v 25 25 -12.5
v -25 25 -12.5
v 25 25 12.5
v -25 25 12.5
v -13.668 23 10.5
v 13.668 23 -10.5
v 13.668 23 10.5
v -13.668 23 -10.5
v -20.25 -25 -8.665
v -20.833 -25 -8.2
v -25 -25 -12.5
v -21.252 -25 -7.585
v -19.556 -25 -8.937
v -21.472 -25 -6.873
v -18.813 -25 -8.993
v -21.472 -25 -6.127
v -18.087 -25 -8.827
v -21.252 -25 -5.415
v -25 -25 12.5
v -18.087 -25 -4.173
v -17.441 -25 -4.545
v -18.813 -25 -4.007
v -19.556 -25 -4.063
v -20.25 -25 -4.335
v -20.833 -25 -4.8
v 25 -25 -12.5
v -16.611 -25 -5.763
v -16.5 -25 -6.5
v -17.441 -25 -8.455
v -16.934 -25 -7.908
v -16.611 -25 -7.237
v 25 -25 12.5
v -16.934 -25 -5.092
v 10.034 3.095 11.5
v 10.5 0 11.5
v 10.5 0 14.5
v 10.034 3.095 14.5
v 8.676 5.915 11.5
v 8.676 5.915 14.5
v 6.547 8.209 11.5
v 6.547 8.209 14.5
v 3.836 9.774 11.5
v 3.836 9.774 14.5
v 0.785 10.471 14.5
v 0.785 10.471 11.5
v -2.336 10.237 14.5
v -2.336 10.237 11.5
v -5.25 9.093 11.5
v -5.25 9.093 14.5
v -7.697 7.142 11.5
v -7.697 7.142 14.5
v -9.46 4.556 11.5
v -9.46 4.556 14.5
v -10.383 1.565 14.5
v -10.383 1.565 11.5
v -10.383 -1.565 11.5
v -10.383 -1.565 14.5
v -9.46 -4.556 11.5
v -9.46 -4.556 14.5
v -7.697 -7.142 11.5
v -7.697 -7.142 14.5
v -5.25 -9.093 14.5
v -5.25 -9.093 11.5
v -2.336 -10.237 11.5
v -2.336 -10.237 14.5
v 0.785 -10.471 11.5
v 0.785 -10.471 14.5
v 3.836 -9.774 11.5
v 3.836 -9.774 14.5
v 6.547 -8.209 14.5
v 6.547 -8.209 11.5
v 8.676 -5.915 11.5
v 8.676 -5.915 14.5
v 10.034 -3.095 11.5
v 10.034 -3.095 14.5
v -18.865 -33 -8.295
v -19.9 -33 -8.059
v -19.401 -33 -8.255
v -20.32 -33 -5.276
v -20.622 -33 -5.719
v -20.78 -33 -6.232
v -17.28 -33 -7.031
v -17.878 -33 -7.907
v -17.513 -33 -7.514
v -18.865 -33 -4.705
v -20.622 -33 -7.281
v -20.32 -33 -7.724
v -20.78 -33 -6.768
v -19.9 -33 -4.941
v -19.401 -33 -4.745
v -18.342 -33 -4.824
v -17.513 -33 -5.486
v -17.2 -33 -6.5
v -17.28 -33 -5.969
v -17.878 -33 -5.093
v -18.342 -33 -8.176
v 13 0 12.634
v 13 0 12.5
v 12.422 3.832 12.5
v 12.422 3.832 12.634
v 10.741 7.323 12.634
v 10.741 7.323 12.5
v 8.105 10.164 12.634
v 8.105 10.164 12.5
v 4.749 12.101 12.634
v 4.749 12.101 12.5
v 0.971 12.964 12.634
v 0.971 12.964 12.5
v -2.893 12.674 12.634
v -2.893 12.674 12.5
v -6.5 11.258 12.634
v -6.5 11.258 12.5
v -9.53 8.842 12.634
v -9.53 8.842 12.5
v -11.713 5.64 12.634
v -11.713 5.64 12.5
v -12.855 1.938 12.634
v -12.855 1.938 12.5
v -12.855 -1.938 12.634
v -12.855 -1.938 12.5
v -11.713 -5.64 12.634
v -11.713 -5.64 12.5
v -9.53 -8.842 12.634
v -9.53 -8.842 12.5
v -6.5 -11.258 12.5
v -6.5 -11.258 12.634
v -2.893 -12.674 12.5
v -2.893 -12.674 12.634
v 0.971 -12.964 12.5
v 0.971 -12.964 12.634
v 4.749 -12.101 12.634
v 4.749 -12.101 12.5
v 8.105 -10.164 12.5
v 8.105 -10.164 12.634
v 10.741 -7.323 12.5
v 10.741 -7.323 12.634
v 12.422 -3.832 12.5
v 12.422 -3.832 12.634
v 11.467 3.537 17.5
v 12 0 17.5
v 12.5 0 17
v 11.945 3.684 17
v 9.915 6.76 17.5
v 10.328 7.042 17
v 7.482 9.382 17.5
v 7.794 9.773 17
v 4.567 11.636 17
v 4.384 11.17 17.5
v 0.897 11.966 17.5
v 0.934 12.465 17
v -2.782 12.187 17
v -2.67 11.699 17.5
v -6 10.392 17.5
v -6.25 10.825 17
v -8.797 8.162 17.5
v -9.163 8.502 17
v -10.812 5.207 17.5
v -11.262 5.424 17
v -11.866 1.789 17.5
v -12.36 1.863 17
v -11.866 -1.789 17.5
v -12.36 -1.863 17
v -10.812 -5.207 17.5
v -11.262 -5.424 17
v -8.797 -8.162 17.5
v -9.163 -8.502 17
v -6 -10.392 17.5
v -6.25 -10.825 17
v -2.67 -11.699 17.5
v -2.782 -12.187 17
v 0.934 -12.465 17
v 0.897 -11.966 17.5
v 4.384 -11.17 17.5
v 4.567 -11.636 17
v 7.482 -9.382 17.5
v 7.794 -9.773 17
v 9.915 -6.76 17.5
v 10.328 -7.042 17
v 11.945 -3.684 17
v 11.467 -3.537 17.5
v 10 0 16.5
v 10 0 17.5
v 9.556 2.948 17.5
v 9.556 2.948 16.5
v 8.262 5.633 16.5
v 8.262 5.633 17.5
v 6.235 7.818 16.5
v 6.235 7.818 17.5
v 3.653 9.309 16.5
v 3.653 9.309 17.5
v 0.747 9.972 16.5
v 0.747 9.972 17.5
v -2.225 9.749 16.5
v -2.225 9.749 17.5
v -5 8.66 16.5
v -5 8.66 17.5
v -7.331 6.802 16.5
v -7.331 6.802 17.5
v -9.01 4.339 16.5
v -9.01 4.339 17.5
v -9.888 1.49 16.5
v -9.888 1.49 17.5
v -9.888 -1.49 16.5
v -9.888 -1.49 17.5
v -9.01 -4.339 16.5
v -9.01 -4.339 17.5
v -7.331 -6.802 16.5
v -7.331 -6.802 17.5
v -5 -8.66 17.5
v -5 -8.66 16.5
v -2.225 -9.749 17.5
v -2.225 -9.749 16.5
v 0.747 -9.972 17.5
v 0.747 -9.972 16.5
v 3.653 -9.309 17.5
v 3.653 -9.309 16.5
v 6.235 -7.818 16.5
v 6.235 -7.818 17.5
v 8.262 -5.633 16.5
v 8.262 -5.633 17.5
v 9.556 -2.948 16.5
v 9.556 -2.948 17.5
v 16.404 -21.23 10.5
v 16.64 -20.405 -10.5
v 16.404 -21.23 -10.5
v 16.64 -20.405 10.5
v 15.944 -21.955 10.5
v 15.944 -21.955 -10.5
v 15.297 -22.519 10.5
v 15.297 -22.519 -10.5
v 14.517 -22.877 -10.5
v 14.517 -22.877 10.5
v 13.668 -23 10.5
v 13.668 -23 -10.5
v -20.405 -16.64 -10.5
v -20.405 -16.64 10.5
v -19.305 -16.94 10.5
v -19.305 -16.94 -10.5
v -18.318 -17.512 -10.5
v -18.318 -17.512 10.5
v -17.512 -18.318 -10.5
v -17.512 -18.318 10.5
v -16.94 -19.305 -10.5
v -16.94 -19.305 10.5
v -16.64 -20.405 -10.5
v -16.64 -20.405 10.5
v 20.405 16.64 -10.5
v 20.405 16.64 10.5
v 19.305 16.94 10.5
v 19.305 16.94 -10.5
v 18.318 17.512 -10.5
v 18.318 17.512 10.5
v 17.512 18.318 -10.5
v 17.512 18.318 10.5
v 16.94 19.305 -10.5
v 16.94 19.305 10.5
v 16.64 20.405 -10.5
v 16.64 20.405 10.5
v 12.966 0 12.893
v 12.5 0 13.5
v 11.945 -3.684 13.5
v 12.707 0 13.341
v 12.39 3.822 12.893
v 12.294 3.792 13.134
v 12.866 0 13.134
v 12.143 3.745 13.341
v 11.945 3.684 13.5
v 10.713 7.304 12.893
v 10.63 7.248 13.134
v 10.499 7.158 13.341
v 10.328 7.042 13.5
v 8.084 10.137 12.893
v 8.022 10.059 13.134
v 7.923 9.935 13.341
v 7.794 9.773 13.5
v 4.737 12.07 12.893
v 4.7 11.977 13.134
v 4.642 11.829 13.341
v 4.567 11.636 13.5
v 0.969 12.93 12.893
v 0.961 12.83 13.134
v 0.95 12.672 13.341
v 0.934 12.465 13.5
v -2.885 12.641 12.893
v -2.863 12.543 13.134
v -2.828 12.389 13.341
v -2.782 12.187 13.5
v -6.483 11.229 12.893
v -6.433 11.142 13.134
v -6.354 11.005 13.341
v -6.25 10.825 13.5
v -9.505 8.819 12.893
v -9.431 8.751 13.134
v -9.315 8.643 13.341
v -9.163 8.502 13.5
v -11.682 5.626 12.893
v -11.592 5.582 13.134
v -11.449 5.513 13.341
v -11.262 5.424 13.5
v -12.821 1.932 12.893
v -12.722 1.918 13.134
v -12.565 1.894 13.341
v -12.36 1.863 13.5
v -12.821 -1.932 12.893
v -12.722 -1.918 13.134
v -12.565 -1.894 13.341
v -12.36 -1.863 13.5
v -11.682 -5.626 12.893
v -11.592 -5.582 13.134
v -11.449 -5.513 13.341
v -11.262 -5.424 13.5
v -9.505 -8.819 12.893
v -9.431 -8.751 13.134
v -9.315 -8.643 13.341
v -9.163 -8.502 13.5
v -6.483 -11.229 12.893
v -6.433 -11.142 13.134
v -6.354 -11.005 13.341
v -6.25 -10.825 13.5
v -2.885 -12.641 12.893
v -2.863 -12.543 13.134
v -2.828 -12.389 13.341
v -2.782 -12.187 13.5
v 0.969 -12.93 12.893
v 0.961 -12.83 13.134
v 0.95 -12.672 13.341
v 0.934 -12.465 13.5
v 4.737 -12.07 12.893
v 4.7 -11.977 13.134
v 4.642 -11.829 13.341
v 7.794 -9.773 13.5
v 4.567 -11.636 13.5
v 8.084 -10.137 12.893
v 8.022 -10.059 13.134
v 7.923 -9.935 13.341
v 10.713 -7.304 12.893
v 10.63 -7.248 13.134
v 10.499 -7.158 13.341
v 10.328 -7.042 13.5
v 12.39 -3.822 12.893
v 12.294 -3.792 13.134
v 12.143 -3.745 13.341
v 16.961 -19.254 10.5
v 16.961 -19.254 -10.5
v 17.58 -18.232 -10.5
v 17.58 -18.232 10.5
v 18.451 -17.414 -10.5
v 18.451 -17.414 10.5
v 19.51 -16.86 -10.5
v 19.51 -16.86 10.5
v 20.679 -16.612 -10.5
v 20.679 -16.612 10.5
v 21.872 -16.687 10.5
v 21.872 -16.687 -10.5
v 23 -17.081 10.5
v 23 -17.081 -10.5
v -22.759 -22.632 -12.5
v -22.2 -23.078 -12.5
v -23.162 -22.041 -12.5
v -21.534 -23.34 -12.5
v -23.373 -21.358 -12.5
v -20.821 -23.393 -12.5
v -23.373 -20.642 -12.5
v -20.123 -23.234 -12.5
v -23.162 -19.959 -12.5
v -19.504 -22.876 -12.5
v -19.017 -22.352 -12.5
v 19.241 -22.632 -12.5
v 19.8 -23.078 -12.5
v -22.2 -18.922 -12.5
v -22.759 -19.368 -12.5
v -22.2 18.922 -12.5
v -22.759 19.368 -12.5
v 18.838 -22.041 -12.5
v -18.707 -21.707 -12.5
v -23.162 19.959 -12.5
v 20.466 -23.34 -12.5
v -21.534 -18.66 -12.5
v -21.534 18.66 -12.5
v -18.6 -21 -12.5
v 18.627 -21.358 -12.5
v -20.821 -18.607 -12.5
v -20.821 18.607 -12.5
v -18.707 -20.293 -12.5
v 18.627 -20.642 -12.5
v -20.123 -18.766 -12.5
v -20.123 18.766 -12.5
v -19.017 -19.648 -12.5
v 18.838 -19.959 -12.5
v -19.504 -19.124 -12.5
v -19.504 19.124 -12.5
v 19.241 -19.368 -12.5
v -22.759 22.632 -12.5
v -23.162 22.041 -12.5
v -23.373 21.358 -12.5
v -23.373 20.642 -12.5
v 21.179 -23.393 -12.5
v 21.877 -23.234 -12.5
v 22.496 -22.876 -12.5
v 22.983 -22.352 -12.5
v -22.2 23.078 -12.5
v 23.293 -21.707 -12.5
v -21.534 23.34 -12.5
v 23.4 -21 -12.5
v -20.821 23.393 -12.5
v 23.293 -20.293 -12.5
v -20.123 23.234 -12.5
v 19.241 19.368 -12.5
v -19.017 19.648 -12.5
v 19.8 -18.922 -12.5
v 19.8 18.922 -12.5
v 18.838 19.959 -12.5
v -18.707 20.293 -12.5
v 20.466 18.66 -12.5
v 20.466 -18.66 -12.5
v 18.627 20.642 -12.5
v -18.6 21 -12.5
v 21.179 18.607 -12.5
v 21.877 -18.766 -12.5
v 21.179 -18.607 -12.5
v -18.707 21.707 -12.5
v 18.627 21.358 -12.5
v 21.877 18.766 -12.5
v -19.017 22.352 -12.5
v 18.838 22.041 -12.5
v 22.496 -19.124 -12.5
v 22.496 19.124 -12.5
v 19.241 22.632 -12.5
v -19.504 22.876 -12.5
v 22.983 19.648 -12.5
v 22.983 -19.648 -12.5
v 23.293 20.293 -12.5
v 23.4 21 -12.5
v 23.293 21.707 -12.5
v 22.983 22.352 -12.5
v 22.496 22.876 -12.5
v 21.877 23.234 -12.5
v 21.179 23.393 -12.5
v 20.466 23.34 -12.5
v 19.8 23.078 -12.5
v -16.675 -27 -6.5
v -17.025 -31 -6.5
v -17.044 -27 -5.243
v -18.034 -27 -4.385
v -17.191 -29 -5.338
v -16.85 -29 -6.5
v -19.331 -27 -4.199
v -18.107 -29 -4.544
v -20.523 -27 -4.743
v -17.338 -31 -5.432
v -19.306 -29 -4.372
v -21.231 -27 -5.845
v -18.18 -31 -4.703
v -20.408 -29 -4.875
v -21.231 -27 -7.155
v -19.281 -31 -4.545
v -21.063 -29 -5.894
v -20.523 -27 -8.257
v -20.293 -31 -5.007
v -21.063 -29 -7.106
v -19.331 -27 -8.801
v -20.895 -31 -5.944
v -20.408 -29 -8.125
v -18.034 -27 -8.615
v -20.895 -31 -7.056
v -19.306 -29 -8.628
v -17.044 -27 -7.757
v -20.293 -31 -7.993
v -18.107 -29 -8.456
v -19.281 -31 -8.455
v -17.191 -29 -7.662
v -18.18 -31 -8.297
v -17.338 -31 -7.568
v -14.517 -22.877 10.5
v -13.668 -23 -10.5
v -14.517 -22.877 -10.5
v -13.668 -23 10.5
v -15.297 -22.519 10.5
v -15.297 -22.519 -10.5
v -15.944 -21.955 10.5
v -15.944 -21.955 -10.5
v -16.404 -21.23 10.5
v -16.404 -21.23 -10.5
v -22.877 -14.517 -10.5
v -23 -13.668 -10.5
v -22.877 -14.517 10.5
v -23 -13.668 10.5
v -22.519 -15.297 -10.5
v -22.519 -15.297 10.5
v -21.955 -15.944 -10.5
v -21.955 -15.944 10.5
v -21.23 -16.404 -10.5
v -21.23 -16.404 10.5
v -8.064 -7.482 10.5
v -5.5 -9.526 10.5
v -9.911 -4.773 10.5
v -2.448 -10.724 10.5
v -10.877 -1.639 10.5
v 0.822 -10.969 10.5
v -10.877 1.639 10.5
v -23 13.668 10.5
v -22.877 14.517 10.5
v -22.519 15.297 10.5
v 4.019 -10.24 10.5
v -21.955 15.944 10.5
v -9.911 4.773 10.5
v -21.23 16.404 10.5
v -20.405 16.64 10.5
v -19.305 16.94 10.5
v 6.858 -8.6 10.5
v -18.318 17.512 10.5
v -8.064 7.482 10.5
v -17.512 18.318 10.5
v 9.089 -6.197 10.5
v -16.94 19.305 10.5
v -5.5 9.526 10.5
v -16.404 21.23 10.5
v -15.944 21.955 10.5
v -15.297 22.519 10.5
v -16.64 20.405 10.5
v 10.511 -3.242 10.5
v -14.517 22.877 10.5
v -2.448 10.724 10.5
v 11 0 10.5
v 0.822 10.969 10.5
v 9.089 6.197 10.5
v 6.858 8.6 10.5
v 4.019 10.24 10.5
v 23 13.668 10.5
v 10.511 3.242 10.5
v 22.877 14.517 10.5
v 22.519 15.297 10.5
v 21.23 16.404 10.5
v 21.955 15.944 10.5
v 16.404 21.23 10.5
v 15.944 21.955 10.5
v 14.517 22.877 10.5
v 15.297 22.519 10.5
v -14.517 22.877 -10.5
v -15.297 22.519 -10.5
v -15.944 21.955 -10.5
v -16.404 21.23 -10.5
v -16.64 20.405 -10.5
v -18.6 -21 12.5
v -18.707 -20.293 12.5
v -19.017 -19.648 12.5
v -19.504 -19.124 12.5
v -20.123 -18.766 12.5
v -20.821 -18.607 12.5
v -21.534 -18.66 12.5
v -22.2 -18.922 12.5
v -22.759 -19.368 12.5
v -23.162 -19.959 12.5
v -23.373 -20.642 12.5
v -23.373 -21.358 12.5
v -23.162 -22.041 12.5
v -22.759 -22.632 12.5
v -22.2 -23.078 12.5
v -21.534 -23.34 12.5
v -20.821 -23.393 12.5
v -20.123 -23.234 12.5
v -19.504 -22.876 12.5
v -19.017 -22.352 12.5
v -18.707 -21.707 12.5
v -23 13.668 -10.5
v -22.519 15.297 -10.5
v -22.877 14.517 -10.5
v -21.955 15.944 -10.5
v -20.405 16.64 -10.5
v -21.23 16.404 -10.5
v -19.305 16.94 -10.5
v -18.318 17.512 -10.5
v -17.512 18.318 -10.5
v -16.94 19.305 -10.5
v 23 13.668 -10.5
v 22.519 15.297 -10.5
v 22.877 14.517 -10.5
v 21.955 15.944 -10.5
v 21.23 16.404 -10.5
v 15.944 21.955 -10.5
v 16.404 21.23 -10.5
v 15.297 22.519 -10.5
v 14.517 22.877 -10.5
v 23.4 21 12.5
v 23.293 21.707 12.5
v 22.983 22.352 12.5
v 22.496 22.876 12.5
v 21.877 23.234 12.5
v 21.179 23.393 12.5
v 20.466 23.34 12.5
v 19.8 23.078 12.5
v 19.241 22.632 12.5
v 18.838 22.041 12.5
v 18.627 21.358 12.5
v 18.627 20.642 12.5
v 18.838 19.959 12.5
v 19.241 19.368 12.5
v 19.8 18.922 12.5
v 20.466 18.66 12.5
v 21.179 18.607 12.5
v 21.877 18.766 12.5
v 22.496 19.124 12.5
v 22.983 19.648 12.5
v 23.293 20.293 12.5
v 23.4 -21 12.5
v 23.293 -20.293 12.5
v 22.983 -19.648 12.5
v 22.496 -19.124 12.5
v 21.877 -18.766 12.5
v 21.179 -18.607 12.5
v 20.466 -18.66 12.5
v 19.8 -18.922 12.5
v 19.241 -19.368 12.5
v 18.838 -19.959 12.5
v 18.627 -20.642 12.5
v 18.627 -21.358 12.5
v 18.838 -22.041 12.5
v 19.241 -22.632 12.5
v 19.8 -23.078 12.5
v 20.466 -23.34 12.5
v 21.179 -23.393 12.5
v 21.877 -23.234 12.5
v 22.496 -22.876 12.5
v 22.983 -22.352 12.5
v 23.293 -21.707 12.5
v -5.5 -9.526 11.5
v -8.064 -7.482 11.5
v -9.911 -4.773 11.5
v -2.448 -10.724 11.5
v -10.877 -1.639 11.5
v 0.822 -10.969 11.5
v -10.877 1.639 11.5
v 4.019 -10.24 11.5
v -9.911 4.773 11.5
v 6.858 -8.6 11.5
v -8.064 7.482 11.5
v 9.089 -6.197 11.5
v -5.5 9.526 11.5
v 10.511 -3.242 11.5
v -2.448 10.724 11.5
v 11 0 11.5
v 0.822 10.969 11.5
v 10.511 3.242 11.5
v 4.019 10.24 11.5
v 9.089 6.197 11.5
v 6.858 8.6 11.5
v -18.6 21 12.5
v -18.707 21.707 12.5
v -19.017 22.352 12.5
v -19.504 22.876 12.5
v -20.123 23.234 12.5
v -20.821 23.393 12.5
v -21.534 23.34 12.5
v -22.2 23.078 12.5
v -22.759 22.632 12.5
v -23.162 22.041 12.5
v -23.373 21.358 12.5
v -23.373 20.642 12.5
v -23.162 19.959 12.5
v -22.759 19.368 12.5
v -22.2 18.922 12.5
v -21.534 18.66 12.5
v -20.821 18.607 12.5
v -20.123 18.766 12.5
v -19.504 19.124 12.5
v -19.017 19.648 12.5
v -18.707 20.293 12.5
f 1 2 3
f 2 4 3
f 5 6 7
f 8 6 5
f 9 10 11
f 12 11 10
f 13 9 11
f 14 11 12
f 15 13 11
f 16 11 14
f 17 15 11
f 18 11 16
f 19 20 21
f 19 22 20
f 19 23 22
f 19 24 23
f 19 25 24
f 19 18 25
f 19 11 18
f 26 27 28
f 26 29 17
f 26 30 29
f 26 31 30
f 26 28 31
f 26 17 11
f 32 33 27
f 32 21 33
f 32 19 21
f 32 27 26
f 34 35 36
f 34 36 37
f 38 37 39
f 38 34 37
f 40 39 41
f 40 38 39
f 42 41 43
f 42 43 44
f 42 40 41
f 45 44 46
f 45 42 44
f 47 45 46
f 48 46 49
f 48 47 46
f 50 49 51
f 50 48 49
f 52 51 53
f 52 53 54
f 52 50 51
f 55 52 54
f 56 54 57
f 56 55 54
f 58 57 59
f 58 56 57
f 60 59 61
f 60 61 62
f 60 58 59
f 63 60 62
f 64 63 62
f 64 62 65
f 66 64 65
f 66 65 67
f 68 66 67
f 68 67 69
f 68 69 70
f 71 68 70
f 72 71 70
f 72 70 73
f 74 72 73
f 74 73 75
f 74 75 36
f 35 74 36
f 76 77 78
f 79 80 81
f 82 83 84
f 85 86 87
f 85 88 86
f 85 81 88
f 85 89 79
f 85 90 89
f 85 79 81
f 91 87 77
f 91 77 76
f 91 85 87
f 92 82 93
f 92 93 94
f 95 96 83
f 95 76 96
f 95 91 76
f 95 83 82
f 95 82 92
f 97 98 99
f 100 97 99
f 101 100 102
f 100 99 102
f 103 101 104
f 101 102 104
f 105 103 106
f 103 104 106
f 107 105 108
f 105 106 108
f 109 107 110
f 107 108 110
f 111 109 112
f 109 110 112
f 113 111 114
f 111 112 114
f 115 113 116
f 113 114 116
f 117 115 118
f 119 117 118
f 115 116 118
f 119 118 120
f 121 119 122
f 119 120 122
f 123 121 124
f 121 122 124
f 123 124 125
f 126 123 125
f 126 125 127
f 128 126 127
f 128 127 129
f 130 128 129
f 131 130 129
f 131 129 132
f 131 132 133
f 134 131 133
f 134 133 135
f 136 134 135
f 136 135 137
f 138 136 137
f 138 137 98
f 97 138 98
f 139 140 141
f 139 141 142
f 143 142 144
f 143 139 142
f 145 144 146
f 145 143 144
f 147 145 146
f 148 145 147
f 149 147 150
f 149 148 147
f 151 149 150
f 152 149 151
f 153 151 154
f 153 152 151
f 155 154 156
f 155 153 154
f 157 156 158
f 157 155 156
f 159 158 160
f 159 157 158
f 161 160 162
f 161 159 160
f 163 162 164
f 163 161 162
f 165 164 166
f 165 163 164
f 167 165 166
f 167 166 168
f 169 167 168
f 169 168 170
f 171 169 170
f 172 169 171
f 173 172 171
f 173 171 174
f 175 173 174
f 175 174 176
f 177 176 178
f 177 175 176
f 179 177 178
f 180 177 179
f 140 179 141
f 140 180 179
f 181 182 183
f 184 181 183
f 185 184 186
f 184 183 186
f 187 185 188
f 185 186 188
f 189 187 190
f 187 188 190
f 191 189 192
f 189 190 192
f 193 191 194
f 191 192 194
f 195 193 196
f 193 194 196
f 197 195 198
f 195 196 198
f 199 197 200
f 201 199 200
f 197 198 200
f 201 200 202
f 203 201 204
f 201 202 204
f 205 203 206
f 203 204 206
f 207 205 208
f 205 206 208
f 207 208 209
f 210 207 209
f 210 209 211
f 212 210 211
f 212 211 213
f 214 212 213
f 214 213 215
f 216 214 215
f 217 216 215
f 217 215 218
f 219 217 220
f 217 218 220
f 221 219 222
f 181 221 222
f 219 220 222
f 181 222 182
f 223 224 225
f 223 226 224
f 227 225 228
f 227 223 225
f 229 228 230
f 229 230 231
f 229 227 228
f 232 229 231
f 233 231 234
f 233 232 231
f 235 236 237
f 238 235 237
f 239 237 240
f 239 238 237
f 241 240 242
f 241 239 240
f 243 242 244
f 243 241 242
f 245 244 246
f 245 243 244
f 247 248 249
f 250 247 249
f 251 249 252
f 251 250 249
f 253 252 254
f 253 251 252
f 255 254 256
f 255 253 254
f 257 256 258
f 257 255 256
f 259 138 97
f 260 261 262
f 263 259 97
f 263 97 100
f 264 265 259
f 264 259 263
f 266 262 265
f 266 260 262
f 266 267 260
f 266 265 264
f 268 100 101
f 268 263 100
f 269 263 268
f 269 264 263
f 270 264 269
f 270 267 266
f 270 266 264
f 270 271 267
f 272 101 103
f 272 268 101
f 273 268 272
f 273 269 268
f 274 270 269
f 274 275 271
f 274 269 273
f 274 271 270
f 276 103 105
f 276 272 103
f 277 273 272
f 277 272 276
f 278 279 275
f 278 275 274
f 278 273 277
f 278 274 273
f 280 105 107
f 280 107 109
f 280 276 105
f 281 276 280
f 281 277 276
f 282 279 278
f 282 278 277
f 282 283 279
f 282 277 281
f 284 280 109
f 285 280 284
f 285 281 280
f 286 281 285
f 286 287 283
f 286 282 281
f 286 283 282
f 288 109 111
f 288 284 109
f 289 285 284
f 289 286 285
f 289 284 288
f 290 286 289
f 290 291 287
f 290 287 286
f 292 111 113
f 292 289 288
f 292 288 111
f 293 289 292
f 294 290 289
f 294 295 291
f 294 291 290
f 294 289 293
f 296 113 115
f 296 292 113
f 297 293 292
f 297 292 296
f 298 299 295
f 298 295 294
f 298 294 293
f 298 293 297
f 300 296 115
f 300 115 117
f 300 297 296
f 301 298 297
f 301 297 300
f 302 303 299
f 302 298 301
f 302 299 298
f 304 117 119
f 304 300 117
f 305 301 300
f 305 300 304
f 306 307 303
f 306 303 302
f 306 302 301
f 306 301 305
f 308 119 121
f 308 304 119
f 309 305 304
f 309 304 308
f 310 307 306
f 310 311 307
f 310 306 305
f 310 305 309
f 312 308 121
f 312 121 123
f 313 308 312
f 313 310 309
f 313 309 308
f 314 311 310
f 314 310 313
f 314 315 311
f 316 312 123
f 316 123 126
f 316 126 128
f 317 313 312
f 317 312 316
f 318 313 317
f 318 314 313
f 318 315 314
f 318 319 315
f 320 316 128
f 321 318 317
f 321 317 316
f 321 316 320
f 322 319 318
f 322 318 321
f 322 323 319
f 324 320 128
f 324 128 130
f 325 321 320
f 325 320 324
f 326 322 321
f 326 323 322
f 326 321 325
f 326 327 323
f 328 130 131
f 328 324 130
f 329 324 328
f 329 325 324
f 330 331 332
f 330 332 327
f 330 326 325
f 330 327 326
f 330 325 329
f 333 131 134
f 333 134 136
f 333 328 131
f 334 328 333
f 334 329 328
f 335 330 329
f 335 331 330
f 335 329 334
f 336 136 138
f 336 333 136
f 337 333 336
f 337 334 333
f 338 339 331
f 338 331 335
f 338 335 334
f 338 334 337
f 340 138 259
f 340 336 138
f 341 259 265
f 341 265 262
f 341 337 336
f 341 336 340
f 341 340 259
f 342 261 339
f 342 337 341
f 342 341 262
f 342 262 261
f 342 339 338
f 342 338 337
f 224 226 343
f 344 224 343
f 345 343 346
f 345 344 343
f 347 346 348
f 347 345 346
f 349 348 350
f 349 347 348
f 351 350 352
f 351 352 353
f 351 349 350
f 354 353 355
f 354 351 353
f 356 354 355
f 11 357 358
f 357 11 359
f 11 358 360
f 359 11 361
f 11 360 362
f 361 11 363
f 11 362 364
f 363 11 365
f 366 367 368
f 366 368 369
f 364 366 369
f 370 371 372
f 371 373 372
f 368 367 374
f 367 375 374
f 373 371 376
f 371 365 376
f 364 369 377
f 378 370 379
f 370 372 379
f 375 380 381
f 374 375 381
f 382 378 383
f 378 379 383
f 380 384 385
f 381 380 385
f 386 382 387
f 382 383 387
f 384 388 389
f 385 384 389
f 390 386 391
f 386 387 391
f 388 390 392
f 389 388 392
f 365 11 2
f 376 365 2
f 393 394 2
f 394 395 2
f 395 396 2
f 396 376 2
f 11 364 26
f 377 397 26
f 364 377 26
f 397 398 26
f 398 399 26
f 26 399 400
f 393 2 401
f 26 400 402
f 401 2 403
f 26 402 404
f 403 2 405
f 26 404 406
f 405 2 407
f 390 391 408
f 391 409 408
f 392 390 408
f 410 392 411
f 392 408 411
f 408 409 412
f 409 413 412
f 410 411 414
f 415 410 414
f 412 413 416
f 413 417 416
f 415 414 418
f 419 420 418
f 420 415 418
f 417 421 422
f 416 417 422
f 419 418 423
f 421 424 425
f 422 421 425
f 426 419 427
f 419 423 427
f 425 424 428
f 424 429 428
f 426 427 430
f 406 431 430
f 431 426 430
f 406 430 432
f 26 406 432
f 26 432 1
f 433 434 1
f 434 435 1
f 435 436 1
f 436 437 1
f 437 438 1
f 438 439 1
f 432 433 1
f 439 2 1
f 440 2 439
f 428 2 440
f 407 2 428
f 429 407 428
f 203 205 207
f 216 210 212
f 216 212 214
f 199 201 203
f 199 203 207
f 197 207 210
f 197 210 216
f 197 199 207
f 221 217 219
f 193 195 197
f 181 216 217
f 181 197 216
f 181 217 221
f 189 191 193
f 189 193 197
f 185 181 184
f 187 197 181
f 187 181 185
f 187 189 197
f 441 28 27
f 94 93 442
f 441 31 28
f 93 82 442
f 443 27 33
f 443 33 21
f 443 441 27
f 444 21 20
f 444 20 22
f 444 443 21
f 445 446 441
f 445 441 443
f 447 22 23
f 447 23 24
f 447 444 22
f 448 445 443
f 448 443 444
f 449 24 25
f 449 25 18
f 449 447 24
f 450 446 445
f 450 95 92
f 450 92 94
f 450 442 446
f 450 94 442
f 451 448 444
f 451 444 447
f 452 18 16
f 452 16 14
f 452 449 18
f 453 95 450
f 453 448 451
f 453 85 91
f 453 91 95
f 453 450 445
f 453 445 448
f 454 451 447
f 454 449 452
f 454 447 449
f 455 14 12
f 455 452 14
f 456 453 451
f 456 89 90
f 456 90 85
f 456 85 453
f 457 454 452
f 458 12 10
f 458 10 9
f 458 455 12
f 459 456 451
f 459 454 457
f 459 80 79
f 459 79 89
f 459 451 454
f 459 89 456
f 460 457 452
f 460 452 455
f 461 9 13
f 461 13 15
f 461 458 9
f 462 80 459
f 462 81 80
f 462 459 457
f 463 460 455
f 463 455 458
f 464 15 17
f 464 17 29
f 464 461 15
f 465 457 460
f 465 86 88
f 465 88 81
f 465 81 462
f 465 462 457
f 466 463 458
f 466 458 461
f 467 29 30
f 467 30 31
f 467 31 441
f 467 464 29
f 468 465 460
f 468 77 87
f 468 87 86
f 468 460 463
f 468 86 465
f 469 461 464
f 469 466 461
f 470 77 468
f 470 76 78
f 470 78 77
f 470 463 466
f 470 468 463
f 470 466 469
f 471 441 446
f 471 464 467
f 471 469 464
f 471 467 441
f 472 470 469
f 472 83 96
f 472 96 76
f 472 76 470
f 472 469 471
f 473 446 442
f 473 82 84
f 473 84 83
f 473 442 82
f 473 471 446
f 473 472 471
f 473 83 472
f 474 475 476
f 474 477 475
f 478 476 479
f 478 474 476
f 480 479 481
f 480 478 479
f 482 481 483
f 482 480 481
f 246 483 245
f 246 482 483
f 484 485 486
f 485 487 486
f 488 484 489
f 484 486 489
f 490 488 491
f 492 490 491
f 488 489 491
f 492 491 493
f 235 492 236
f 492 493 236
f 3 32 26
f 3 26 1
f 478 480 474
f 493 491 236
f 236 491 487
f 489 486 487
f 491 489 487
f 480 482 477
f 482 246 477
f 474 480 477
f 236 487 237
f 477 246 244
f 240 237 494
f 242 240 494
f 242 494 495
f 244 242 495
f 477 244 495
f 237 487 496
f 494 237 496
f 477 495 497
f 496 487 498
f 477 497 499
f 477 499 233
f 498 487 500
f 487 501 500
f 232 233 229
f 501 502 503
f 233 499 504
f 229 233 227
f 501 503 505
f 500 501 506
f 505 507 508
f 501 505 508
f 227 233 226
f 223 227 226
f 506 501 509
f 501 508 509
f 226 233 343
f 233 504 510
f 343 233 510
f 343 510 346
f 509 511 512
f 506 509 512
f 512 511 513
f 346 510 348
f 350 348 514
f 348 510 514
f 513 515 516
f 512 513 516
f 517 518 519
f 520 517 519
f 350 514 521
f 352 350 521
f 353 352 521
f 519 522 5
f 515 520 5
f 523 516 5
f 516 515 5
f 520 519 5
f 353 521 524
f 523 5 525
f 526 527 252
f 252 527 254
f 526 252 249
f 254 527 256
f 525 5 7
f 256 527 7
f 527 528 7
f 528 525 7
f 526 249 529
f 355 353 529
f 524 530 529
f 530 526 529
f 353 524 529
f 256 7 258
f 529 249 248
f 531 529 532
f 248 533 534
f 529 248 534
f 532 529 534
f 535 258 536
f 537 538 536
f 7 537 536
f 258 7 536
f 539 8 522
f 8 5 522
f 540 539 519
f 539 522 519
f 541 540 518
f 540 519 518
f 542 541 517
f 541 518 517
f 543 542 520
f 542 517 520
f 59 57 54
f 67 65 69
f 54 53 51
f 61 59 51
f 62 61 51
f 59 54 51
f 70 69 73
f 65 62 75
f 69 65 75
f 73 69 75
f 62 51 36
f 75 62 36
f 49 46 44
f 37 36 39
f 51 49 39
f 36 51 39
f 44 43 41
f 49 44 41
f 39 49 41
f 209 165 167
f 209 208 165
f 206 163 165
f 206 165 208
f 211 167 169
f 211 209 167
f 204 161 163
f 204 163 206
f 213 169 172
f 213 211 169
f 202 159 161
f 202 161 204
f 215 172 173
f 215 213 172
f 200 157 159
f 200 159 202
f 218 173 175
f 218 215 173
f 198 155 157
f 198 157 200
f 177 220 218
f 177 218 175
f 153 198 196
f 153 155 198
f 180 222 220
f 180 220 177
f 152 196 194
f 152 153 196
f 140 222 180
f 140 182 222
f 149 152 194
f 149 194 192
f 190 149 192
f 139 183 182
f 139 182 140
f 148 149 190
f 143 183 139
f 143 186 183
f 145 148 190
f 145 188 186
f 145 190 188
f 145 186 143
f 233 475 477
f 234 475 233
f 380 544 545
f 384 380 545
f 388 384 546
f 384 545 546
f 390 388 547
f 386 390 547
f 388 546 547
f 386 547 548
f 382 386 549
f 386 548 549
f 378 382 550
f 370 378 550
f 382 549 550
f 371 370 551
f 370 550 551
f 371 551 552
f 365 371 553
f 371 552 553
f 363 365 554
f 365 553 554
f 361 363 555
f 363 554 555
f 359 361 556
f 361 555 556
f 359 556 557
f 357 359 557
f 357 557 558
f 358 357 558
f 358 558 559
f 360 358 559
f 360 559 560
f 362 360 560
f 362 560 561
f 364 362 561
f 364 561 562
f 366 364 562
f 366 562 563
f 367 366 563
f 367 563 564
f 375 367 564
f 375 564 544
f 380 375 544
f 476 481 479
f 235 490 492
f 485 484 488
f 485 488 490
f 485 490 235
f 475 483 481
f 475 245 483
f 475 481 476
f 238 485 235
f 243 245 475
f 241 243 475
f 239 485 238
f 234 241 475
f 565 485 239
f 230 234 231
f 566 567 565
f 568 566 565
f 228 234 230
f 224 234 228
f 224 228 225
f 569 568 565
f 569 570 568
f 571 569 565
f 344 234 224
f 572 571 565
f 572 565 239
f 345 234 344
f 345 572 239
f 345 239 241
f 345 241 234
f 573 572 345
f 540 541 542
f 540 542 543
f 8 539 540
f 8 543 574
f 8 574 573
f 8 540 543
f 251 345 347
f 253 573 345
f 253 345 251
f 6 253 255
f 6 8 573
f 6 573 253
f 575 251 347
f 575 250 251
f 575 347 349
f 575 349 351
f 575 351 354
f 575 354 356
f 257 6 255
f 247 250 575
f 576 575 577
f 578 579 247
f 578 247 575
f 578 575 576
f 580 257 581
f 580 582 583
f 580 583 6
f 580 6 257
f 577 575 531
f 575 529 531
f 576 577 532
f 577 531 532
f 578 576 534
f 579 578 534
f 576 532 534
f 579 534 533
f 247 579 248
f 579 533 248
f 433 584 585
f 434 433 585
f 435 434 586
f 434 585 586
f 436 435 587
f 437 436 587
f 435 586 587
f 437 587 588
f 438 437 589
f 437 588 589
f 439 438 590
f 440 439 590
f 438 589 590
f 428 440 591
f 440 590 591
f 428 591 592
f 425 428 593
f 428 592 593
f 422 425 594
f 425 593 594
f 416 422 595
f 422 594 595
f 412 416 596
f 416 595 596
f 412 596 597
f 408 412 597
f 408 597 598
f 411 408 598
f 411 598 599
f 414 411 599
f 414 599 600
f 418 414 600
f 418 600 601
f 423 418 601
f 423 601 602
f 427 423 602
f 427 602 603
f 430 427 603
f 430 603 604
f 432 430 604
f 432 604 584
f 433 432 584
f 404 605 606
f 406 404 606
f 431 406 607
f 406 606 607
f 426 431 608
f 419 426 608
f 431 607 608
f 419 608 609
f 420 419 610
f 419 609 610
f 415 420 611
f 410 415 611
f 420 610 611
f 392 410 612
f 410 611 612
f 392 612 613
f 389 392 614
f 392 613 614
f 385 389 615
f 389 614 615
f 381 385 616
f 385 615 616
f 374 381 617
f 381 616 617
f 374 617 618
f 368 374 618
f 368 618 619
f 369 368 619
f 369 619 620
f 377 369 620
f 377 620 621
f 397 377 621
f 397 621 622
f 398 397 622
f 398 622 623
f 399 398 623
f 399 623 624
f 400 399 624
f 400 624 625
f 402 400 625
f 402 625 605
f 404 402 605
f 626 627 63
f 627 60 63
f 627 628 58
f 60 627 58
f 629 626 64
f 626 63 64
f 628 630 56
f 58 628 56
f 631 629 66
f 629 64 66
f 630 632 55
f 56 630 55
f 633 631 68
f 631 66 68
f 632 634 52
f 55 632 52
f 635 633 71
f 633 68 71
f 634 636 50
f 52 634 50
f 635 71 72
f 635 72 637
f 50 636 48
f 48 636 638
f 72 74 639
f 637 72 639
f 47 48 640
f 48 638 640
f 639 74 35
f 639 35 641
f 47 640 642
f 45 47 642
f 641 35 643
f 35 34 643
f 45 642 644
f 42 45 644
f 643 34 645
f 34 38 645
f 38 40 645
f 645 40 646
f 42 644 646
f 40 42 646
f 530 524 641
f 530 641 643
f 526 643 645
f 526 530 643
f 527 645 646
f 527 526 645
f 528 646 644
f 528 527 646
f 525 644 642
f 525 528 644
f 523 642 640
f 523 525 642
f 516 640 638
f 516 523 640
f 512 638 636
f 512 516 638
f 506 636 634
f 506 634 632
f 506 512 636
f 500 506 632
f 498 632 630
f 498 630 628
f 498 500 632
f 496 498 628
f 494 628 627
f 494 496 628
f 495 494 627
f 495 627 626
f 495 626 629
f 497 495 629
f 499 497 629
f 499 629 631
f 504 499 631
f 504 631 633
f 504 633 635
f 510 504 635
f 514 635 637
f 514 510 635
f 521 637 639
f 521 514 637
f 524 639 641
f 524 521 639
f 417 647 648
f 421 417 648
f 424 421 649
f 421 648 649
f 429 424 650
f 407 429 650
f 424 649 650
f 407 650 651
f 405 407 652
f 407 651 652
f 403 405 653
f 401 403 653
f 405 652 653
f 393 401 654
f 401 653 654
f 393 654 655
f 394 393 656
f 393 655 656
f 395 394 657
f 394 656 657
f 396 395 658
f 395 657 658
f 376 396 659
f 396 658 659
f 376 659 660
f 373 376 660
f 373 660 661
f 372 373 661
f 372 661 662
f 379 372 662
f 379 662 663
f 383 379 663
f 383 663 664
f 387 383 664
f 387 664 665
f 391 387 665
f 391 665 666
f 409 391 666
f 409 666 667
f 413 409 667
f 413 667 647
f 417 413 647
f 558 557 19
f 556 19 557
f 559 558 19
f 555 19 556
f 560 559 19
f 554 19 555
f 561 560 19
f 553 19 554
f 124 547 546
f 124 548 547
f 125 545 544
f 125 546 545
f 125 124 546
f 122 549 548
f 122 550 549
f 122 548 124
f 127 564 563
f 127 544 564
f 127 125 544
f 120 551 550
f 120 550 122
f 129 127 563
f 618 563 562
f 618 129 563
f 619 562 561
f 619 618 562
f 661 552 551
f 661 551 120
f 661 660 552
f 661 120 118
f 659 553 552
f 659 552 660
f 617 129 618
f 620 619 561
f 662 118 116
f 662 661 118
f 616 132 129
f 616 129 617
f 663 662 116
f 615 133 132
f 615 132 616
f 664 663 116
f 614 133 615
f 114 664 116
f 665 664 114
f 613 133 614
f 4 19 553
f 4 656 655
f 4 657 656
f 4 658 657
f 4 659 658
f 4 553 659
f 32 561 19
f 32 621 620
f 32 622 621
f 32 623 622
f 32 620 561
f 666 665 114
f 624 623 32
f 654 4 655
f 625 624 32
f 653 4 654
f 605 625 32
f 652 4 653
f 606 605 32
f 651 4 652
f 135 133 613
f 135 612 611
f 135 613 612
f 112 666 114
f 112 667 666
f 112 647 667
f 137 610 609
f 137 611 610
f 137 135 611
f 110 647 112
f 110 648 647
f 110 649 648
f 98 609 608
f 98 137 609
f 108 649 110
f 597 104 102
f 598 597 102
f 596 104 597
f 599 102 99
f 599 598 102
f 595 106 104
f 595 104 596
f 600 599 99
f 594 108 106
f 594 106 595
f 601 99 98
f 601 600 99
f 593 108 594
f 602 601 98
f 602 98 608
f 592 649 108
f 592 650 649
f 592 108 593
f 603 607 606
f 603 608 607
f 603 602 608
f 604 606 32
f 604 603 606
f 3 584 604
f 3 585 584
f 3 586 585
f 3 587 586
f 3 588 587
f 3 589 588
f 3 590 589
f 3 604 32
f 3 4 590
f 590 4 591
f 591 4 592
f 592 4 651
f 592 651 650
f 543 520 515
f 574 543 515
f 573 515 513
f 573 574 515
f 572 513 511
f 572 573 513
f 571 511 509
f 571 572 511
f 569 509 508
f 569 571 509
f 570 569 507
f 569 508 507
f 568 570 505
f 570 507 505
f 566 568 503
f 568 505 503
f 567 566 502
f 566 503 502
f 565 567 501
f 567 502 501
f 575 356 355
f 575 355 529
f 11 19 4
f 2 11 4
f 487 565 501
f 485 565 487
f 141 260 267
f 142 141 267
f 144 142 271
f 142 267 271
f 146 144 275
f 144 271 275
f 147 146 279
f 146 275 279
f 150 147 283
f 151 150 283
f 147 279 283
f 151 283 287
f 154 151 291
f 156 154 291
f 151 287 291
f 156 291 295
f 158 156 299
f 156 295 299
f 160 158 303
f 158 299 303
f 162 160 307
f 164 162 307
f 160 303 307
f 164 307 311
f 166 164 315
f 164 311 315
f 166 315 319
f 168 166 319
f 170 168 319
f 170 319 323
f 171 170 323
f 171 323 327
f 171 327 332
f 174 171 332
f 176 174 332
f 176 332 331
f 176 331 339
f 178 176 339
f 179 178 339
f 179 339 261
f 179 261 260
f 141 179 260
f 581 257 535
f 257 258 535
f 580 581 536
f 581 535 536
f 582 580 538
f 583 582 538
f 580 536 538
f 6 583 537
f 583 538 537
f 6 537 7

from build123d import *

# Parameters (mm, degrees)
SKETCH1_W            = 50
SKETCH1_H            = 50
BOSS_EXTRUDE1_DEPTH  = 12.5
SKETCH2_R            = 12.5
BOSS_EXTRUDE2_DEPTH  = 5
CUT_EXTRUDE1_REACH   = 45.301
SKETCH4_R            = 2.4
SKETCH5_R            = 13
BOSS_EXTRUDE3_DEPTH  = 1
SHELL1_START         = -10.5
SHELL1_DEPTH         = 21
SHELL1_START_2       = 10.5
SHELL1_2_OUTLINE_R   = 10.5
SHELL1_2_DEPTH       = 4
SHELL1_3_OUTLINE_R   = 11
SHELL1_3_OUTLINE_R_2 = 10.5
SHELL1_3_DEPTH       = 1
FILLET1_R            = 3
SKETCH6_R            = 10
CUT_EXTRUDE2_DEPTH   = 1
FILLET2_R            = 1
CHAMFER1_SIZE        = 0.5
SKETCH7_R            = 2.5
BOSS_EXTRUDE4_DEPTH  = 8
BOSS_EXTRUDE4_TAPER  = 5


# Read off the part's stored shape, not the designer's step: Shell1
with BuildPart() as part:
    # Sketch1 → Boss-Extrude1 (new, symmetric)
    with BuildSketch(Plane.XY):
        Rectangle(SKETCH1_W, SKETCH1_H)
    extrude(amount=BOSS_EXTRUDE1_DEPTH, both=True)

    # Sketch2 → Boss-Extrude2 (add)
    with BuildSketch(Plane.XY.offset(12.5)):
        Circle(SKETCH2_R)
    extrude(amount=BOSS_EXTRUDE2_DEPTH)

    # Sketch4 → Cut-Extrude1 (cut, up to next)
    with BuildSketch(Plane.XY.offset(12.5), mode=Mode.PRIVATE) as cut_extrude1_sk1:
        with Locations((-21, 21)):
            Circle(SKETCH4_R)
    cut_extrude1_tool1 = extrude(cut_extrude1_sk1.sketch, amount=-CUT_EXTRUDE1_REACH, mode=Mode.PRIVATE) & part.part
    # Sketch4 → Cut-Extrude1 (cut, up to next)
    with BuildSketch(Plane.XY.offset(12.5), mode=Mode.PRIVATE) as cut_extrude1_sk2:
        with Locations((21, 21)):
            Circle(SKETCH4_R)
    cut_extrude1_tool2 = extrude(cut_extrude1_sk2.sketch, amount=-CUT_EXTRUDE1_REACH, mode=Mode.PRIVATE) & part.part
    # Sketch4 → Cut-Extrude1 (cut, up to next)
    with BuildSketch(Plane.XY.offset(12.5), mode=Mode.PRIVATE) as cut_extrude1_sk3:
        with Locations((-21, -21)):
            Circle(SKETCH4_R)
    cut_extrude1_tool3 = extrude(cut_extrude1_sk3.sketch, amount=-CUT_EXTRUDE1_REACH, mode=Mode.PRIVATE) & part.part
    # Sketch4 → Cut-Extrude1 (cut, up to next)
    with BuildSketch(Plane.XY.offset(12.5), mode=Mode.PRIVATE) as cut_extrude1_sk4:
        with Locations((21, -21)):
            Circle(SKETCH4_R)
    cut_extrude1_tool4 = extrude(cut_extrude1_sk4.sketch, amount=-CUT_EXTRUDE1_REACH, mode=Mode.PRIVATE) & part.part
    add(cut_extrude1_tool1.solids().sort_by_distance((-21, 21, 12.5))[0], mode=Mode.SUBTRACT)
    add(cut_extrude1_tool2.solids().sort_by_distance((21, 21, 12.5))[0], mode=Mode.SUBTRACT)
    add(cut_extrude1_tool3.solids().sort_by_distance((-21, -21, 12.5))[0], mode=Mode.SUBTRACT)
    add(cut_extrude1_tool4.solids().sort_by_distance((21, -21, 12.5))[0], mode=Mode.SUBTRACT)

    # Sketch5 → Boss-Extrude3 (add)
    with BuildSketch(Plane.XY.offset(12.5)):
        Circle(SKETCH5_R)
    extrude(amount=BOSS_EXTRUDE3_DEPTH)

    # Shell1 outline → Shell1 (cut)
    with BuildSketch(Plane.XY.offset(SHELL1_START)):
        with BuildLine():
            Line((23, -17.080816412), (23, 17.080816412))
            ThreePointArc((23, 17.080816412), (17.888730163, 17.888730163), (17.080816412, 23))
            Line((17.080816412, 23), (-17.080816412, 23))
            ThreePointArc((-17.080816412, 23), (-17.888730163, 17.888730163), (-23, 17.080816412))
            Line((-23, 17.080816412), (-23, -17.080816412))
            ThreePointArc((-23, -17.080816412), (-17.888730163, -17.888730163), (-17.080816412, -23))
            Line((-17.080816412, -23), (17.080816412, -23))
            ThreePointArc((17.080816412, -23), (17.888730163, -17.888730163), (23, -17.080816412))
        make_face()
    extrude(amount=SHELL1_DEPTH, mode=Mode.SUBTRACT)

    # Shell1 2 outline → Shell1 2 (cut)
    with BuildSketch(Plane.XY.offset(SHELL1_START_2)):
        Circle(SHELL1_2_OUTLINE_R)
    extrude(amount=SHELL1_2_DEPTH, mode=Mode.SUBTRACT)

    # Shell1 3 outline → Shell1 3 (cut)
    with BuildSketch(Plane.XY.offset(SHELL1_START_2)):
        Circle(SHELL1_3_OUTLINE_R)
        Circle(SHELL1_3_OUTLINE_R_2, mode=Mode.SUBTRACT)
    extrude(amount=SHELL1_3_DEPTH, mode=Mode.SUBTRACT)

    # Fillet1
    fillet1_edges = [part.edges().sort_by_distance(p)[0] for p in [
        (23, 17.080816412, 0),
        (-17.080816412, 23, 0),
        (-23, -17.080816412, 0),
        (17.080816412, -23, 0),
        (-23, 17.080816412, 0),
        (-17.080816412, -23, 0),
        (17.080816412, 23, 0),
    ]]
    fillet(fillet1_edges, radius=FILLET1_R)

    # Sketch6 → Cut-Extrude2 (cut)
    with BuildSketch(Plane.XY.offset(17.5)):
        Circle(SKETCH6_R)
    extrude(amount=-CUT_EXTRUDE2_DEPTH, mode=Mode.SUBTRACT)

    # Fillet2
    # the kernel refuses this fillet: 1 mm, written as the material it takes off along each edge
    with BuildSketch(Plane(origin=(0, 0, 13.5), x_dir=(1, 0, 0), z_dir=(0, -1, 0))) as fillet2_piece_1:
        with BuildLine():
            CenterArc((12, -0.866025404), FILLET2_R, 0, 60)
            Line((12.5, 0), (12.51, 0.017320508))
            ThreePointArc((12.51, 0.017320508), (12.75, 0.02), (13, 0.02))
            Line((13, 0.02), (13.02, 0))
            Line((13.02, 0), (13.02, -0.866025404))
            Line((13.02, -0.866025404), (13, -0.866025404))
        make_face()
    revolve(axis=Axis((0, 0, 13.5), (0, 0, 1)), mode=Mode.SUBTRACT)

    # Chamfer1
    chamfer1_edges = [part.edges().sort_by_distance(p)[0] for p in [
        (-12.5, 0, 17.5),
    ]]
    chamfer(chamfer1_edges, length=CHAMFER1_SIZE)

    # Sketch7 → Boss-Extrude4 (add)
    with BuildSketch(Plane.XZ.offset(25)):
        with Locations((-19, -6.5)):
            Circle(SKETCH7_R)
    extrude(amount=BOSS_EXTRUDE4_DEPTH, taper=BOSS_EXTRUDE4_TAPER)


solid = part.part
